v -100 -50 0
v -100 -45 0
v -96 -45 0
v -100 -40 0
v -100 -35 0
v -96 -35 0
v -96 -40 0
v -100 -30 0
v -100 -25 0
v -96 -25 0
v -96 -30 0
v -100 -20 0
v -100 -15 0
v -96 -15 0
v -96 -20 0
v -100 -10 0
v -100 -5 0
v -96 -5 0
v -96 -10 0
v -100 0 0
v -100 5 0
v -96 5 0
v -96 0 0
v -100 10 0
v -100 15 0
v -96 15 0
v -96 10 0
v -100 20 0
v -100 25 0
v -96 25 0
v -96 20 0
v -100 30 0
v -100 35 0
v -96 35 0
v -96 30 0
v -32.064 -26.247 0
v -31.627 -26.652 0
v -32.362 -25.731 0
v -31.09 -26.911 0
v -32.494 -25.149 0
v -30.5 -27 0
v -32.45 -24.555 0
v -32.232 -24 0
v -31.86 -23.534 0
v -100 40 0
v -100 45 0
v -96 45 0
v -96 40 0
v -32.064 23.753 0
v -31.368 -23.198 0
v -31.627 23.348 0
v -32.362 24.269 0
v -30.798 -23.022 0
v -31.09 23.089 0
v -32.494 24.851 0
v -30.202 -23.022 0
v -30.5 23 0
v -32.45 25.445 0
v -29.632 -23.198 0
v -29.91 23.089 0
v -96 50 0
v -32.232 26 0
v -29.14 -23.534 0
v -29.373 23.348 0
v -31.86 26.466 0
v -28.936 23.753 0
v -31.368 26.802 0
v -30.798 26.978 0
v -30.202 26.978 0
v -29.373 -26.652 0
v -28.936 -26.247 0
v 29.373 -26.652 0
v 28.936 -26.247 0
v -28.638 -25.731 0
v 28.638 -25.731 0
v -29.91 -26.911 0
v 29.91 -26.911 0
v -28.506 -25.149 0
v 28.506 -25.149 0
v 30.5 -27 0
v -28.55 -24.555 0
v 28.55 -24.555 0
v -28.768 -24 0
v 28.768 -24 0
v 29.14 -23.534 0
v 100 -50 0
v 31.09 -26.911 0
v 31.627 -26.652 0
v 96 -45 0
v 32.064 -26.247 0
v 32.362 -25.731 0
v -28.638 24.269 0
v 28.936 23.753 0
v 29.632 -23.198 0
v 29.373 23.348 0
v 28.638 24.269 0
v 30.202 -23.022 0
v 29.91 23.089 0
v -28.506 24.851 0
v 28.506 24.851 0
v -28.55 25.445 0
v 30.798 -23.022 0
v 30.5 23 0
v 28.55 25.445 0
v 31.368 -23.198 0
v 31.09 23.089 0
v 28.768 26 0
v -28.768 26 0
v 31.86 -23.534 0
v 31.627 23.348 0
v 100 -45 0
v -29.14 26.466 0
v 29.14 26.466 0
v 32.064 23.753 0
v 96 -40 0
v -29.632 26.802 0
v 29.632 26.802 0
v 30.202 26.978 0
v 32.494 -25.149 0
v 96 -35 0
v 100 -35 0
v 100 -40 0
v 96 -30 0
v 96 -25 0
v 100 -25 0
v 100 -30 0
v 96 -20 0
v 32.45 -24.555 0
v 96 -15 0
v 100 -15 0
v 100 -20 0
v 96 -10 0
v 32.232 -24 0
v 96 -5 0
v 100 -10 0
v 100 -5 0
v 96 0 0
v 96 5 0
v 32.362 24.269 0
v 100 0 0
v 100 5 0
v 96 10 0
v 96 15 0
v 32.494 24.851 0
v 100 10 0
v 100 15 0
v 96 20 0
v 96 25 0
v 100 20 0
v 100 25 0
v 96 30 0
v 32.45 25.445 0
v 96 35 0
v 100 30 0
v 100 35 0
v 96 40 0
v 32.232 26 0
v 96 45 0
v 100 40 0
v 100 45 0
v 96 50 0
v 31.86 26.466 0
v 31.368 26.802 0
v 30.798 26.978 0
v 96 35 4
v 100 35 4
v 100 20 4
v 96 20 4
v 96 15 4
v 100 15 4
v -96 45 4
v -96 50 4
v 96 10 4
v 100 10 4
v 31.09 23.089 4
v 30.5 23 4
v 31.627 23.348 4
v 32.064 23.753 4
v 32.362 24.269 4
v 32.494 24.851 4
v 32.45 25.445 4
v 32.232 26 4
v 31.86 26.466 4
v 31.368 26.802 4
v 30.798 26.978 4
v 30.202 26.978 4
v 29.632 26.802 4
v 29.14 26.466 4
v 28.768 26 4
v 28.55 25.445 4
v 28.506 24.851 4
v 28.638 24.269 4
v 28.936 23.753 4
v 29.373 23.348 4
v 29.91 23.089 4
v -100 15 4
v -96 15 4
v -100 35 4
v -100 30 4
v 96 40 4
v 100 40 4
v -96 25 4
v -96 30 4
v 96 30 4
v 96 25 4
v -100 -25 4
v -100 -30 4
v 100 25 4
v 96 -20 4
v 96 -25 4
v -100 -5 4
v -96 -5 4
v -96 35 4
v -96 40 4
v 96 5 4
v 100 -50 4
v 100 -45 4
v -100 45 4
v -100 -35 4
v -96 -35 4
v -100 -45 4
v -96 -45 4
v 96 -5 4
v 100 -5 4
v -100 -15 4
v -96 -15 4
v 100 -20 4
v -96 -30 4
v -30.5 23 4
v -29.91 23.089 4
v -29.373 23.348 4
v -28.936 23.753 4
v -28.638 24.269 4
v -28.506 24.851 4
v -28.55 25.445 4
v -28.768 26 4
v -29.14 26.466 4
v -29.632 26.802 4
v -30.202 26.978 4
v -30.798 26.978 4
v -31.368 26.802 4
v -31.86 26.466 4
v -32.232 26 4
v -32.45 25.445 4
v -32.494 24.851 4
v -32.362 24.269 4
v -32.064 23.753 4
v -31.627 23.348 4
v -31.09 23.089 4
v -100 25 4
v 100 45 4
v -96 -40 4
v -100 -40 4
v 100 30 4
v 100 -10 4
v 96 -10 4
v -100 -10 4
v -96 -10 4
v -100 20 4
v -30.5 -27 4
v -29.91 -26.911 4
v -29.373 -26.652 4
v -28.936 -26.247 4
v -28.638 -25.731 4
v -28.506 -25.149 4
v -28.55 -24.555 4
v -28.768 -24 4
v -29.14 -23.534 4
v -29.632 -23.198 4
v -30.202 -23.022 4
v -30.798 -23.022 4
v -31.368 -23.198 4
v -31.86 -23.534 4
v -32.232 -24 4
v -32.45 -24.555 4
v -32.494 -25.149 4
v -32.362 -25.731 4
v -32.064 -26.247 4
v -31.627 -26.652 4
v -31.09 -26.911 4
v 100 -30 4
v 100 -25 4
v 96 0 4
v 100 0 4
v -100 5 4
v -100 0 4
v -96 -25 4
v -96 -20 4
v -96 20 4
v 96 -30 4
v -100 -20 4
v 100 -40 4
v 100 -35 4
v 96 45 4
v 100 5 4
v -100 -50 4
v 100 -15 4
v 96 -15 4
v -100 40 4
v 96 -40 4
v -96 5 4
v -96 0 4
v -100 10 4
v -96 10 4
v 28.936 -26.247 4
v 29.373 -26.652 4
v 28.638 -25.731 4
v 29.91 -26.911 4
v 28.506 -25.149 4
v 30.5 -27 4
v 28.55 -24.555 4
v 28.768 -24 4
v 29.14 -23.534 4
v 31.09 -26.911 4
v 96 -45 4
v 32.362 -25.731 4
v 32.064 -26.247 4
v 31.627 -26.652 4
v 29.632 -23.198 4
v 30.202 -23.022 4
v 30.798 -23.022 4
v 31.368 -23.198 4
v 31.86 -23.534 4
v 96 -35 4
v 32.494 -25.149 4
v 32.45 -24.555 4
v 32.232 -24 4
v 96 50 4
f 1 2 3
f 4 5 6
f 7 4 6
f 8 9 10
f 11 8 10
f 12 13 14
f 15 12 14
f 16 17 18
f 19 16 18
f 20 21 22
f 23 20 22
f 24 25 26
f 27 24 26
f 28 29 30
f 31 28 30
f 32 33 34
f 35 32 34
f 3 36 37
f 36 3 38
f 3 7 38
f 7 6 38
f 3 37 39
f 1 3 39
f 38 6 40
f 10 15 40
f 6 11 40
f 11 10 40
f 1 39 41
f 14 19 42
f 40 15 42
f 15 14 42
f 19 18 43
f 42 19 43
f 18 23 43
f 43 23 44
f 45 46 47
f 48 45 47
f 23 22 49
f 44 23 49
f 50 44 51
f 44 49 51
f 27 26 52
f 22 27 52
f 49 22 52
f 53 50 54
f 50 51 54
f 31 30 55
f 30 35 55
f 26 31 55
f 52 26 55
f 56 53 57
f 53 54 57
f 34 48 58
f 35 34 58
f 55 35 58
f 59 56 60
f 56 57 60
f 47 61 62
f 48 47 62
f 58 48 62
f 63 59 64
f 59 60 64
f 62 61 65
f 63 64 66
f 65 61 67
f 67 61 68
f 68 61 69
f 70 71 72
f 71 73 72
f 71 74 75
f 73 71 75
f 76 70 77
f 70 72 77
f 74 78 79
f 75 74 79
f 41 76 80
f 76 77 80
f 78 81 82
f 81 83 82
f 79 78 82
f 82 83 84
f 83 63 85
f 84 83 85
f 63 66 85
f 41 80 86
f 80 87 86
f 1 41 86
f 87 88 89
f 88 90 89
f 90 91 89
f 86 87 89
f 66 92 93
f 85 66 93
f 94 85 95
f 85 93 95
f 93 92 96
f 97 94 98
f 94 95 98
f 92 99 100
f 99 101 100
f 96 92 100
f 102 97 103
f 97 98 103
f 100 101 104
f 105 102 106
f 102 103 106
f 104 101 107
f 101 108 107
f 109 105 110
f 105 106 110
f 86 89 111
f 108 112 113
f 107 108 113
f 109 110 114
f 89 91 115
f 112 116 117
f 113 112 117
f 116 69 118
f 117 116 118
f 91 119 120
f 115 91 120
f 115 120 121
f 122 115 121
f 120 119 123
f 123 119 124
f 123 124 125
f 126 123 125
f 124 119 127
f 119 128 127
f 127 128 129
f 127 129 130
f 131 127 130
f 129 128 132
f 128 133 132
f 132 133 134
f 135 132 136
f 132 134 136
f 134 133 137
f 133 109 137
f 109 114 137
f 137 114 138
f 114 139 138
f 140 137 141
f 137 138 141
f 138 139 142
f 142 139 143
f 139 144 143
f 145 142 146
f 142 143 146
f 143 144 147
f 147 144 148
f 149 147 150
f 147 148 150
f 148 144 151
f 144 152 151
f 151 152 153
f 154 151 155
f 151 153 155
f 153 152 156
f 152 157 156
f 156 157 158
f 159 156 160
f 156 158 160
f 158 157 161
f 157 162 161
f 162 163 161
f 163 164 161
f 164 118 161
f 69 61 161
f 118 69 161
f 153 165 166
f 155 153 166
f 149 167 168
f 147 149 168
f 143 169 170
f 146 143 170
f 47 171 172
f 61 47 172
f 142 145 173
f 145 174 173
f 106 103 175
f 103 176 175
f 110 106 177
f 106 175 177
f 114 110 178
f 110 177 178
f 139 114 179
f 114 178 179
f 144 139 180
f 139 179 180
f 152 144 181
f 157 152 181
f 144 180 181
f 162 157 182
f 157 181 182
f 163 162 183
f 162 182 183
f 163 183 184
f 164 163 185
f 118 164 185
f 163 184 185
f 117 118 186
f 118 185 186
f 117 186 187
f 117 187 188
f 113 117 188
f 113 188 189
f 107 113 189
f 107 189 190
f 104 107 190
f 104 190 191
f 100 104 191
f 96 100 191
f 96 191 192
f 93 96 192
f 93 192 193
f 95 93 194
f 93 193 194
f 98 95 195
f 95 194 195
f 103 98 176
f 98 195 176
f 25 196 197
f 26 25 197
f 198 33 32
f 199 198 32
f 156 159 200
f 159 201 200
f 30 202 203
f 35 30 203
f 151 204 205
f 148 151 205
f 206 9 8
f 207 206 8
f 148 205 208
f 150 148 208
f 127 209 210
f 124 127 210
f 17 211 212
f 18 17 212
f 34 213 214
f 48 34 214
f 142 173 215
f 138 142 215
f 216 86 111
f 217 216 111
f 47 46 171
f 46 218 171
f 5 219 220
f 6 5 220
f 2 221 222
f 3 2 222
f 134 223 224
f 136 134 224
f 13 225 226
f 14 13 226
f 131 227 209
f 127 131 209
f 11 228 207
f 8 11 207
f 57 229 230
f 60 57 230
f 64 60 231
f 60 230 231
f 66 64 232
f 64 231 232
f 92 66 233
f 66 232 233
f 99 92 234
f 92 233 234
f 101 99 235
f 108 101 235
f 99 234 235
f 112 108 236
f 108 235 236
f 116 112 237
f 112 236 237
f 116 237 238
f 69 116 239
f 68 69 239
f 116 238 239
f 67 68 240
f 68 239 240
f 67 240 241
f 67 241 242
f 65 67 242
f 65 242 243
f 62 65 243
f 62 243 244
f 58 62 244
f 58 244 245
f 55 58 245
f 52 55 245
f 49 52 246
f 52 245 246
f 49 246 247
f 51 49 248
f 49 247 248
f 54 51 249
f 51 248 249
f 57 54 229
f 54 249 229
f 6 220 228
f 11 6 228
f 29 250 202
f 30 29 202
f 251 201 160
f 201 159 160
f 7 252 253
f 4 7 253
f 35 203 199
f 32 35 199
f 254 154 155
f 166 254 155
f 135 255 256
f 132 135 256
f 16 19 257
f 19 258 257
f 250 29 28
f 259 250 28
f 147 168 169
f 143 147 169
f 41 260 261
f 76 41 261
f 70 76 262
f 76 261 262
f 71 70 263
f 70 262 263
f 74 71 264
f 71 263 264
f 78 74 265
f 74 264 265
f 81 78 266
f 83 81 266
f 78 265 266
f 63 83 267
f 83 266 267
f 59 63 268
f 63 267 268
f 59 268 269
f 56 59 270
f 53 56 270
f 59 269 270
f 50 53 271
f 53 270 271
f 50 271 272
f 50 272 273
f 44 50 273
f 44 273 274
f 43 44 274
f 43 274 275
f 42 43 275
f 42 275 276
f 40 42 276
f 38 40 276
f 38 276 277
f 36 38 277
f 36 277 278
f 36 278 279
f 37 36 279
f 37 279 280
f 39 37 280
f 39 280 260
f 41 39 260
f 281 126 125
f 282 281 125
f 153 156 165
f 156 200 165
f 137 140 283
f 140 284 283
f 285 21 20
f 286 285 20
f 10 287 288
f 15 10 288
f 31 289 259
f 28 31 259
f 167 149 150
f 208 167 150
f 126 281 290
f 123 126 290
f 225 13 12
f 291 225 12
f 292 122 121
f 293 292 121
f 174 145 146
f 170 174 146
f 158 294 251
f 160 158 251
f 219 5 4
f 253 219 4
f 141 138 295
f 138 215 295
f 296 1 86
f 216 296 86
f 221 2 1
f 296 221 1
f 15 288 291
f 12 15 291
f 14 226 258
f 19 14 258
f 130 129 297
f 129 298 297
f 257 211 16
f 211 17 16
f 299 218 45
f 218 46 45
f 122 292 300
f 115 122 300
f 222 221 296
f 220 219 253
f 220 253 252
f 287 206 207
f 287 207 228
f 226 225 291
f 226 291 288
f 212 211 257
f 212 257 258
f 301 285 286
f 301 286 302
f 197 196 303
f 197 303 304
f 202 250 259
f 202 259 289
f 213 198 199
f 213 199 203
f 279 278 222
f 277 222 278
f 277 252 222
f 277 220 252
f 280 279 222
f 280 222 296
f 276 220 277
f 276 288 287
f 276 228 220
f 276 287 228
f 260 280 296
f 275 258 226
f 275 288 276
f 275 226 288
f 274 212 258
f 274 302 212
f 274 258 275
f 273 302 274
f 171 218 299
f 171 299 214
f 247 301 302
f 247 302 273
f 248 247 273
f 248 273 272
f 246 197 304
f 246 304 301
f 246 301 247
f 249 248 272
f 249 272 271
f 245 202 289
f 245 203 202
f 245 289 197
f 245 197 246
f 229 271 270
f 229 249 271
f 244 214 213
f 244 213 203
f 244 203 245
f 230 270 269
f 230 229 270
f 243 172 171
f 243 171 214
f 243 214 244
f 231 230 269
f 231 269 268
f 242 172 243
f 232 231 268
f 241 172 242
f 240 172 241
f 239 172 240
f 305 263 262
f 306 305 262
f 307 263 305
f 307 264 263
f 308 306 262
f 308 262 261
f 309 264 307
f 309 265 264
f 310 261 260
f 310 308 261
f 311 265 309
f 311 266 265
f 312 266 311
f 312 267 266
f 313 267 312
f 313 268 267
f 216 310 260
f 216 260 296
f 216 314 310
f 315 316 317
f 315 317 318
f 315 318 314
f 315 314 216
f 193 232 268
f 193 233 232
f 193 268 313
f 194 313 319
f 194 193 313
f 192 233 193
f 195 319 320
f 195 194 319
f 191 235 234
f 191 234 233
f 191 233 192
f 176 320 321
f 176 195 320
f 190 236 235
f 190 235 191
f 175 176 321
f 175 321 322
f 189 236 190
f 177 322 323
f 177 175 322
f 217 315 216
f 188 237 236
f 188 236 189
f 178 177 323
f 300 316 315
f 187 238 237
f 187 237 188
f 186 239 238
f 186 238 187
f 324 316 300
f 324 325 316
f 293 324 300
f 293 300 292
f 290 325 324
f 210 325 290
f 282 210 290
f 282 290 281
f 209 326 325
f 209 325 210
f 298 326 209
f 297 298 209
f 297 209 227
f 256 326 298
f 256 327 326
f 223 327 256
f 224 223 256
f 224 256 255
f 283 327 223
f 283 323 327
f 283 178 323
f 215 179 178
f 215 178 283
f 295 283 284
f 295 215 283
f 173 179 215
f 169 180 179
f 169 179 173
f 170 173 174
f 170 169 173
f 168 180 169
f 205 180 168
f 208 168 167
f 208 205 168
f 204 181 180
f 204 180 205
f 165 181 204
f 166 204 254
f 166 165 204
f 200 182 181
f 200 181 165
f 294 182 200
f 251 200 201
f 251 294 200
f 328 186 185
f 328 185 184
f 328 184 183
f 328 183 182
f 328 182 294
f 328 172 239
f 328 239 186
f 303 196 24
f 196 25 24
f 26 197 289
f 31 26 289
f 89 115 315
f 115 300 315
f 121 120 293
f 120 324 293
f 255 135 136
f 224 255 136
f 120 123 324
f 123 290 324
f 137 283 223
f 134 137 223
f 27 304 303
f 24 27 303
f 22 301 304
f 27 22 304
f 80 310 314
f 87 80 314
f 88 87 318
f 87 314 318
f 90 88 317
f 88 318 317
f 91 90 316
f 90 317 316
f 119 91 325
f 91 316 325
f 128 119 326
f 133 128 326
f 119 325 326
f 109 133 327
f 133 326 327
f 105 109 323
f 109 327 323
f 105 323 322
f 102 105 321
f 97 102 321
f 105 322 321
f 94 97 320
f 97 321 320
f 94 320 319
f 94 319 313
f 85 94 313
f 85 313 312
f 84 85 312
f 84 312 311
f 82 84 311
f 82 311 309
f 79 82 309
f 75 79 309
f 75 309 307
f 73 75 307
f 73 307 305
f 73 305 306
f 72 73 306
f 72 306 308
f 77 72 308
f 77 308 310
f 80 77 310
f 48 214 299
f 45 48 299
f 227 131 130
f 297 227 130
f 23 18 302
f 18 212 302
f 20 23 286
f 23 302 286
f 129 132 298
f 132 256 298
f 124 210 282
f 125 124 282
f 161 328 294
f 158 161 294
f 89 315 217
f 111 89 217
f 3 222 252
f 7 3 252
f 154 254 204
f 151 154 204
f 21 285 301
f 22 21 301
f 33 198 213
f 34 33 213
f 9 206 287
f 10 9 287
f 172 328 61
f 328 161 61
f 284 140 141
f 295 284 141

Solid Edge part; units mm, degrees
sketch "Sketch1" plane through (0, 0, 0) normal (0, 0, 1) x (1, 0, 0)
  line L0 (-100, -50) -> (100, -50)
  line L1 (100, -50) -> (100, 50)
  line L2 (100, 50) -> (-100, 50)
  line L3 (-100, 50) -> (-100, -50)
  dimension "D1" = 100
  dimension "D2" = 200
  dimension "D3" = 100
  dimension "D4" = 50
extrude "Protrusion1" add sketch "Sketch1" along normal blind 4
sketch "Sketch2" plane through (14.6999, -33.2226, 4) normal (0, 0, 1) x (1, 0, 0)
  line L0 (-114.6999, 68.2226) -> (-110.6999, 68.2226)
  line L1 (-110.6999, 68.2226) -> (-110.6999, 73.2226)
  line L2 (-110.6999, 73.2226) -> (-114.6999, 73.2226)
  line L3 (-114.6999, 73.2226) -> (-114.6999, 68.2226)
  line L4 (-114.6999, 58.2226) -> (-110.6999, 58.2226)
  line L5 (-110.6999, 58.2226) -> (-110.6999, 63.2226)
  line L6 (-110.6999, 63.2226) -> (-114.6999, 63.2226)
  line L7 (-114.6999, 63.2226) -> (-114.6999, 58.2226)
  line L8 (-114.6999, 48.2226) -> (-110.6999, 48.2226)
  line L9 (-110.6999, 48.2226) -> (-110.6999, 53.2226)
  line L10 (-110.6999, 53.2226) -> (-114.6999, 53.2226)
  line L11 (-114.6999, 53.2226) -> (-114.6999, 48.2226)
  line L12 (-114.6999, 38.2226) -> (-110.6999, 38.2226)
  line L13 (-110.6999, 38.2226) -> (-110.6999, 43.2226)
  line L14 (-110.6999, 43.2226) -> (-114.6999, 43.2226)
  line L15 (-114.6999, 43.2226) -> (-114.6999, 38.2226)
  line L16 (-114.6999, 28.2226) -> (-110.6999, 28.2226)
  line L17 (-110.6999, 28.2226) -> (-110.6999, 33.2226)
  line L18 (-110.6999, 33.2226) -> (-114.6999, 33.2226)
  line L19 (-114.6999, 33.2226) -> (-114.6999, 28.2226)
  line L20 (-114.6999, 18.2226) -> (-110.6999, 18.2226)
  line L21 (-110.6999, 18.2226) -> (-110.6999, 23.2226)
  line L22 (-110.6999, 23.2226) -> (-114.6999, 23.2226)
  line L23 (-114.6999, 23.2226) -> (-114.6999, 18.2226)
  line L24 (-114.6999, 8.2226) -> (-110.6999, 8.2226)
  line L25 (-110.6999, 8.2226) -> (-110.6999, 13.2226)
  line L26 (-110.6999, 13.2226) -> (-114.6999, 13.2226)
  line L27 (-114.6999, 13.2226) -> (-114.6999, 8.2226)
  line L28 (-114.6999, -1.7774) -> (-110.6999, -1.7774)
  line L29 (-110.6999, -1.7774) -> (-110.6999, 3.2226)
  line L30 (-110.6999, 3.2226) -> (-114.6999, 3.2226)
  line L31 (-114.6999, 3.2226) -> (-114.6999, -1.7774)
  line L32 (-114.6999, -11.7774) -> (-110.6999, -11.7774)
  line L33 (-110.6999, -11.7774) -> (-110.6999, -6.7774)
  line L34 (-110.6999, -6.7774) -> (-114.6999, -6.7774)
  line L35 (-114.6999, -6.7774) -> (-114.6999, -11.7774)
  line L36 (-114.6999, 78.2226) -> (-110.6999, 78.2226)
  line L37 (-110.6999, 78.2226) -> (-110.6999, 83.2226)
  line L38 (-110.6999, 83.2226) -> (-114.6999, 83.2226)
  line L39 (-114.6999, 83.2226) -> (-114.6999, 78.2226)
  dimension "D1" = 5
  dimension "D2" = 4
  dimension "D3" = 4
  dimension "D4" = 5
  dimension "D5" = 5
  dimension "D6" = 4
  dimension "D7" = 5
  dimension "D8" = 4
  dimension "D9" = 4
  dimension "D10" = 5
  dimension "D11" = 4
  dimension "D12" = 5
  dimension "D13" = 4
  dimension "D14" = 5
  dimension "D15" = 4
  dimension "D16" = 5
  dimension "D17" = 4
  dimension "D18" = 5
  dimension "D19" = 5
  dimension "D20" = 5
  dimension "D21" = 5
  dimension "D22" = 5
  dimension "D23" = 5
  dimension "D24" = 5
  dimension "D25" = 5
  dimension "D26" = 5
  dimension "D27" = 5
  dimension "D28" = 4
  dimension "D29" = 5
  dimension "D30" = 5
extrude "Cutout1" cut sketch "Sketch2" against normal through all
mirror "Mirror1" about plane through (0, 0, 0) normal (1, 0, 0) of "Cutout1"
hole "Hole_1" at (30.5, 25, 4) direction (0, 0, -1) diameter 4 end through all
hole "Hole1" at (30.5, -25, 4) direction (0, 0, -1) diameter 4 end through all
hole "Hole2" at (-30.5, -25, 4) direction (0, 0, -1) diameter 4 end through all
hole "Hole3" at (-30.5, 25, 4) direction (0, 0, -1) diameter 4 end through all
